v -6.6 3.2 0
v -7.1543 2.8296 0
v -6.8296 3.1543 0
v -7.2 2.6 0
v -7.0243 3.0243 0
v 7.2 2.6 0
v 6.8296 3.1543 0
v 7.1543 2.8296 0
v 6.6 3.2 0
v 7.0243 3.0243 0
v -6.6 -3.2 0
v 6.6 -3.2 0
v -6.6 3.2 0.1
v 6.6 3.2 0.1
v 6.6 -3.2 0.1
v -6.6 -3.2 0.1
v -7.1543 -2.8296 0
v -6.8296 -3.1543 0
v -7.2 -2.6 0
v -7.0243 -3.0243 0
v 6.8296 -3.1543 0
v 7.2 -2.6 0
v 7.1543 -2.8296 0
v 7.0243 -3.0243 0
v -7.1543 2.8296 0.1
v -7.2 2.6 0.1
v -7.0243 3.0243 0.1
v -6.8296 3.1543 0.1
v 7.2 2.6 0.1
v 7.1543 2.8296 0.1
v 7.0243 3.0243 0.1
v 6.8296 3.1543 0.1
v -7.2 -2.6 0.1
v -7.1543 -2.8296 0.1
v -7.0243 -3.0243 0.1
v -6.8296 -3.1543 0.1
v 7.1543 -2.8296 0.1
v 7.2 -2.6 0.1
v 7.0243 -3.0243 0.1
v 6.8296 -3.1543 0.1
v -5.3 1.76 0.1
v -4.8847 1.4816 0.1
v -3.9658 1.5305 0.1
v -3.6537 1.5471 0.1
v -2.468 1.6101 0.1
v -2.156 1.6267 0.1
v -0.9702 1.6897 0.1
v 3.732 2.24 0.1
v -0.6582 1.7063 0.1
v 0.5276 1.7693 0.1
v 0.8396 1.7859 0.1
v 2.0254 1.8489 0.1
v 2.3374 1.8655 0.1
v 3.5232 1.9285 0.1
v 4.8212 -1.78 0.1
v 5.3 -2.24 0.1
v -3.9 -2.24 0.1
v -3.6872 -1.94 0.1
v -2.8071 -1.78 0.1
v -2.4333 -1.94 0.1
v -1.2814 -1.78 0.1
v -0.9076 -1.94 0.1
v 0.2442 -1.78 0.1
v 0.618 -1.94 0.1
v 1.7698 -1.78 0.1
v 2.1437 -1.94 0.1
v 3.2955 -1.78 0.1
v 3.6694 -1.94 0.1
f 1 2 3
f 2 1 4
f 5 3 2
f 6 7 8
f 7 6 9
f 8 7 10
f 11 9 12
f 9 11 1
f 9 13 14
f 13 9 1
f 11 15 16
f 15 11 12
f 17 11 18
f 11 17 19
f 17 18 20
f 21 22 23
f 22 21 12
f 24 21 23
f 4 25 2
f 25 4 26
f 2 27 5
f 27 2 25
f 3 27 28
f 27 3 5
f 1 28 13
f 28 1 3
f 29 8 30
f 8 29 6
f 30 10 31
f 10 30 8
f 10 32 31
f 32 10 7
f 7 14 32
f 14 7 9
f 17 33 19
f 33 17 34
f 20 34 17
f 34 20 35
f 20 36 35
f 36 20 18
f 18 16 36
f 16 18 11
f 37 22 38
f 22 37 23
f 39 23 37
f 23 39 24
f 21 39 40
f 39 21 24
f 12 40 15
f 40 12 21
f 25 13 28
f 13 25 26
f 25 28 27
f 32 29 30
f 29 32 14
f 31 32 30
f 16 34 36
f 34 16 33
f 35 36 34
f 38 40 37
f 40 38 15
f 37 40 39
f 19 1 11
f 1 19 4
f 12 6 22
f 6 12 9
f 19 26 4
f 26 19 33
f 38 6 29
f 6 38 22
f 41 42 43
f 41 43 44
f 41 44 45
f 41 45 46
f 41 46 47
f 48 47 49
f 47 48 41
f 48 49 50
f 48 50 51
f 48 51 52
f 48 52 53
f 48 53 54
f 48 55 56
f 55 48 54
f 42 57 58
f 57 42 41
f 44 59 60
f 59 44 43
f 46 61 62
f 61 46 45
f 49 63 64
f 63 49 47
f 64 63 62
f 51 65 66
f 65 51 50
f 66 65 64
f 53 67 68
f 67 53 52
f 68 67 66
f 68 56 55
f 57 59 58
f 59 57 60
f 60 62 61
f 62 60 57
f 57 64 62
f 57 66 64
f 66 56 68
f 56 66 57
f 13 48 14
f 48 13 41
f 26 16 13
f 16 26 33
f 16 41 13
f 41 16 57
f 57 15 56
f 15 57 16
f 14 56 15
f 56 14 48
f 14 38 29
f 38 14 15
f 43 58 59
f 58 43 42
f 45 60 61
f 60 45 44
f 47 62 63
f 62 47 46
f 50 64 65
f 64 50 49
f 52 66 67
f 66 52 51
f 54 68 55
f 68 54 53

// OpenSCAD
// file: ../p/box3u12.scad
use <../lib.scad>
function ldraw_lib__box3u12() = [
// 0 Box with 3 Parallel Faces without Any Edges
// 0 Name: box3u12.dat
// 0 Author: J.C. Tchang [tchang]
// 0 !LDRAW_ORG Primitive UPDATE 2014-02
// 0 !LICENSE Licensed under CC BY 4.0 : see CAreadme.txt
// 
// 0 BFC CERTIFY CCW
  [0,"BFC","CERTIFY"],
  [0,"BFC","CCW"],
// 
// 0 !HISTORY 2014-12-23 [PTadmin] Official Update 2014-02
// 
// 
// 4 16 -1 1 1 1 1 1 1 1 -1 -1 1 -1
  [4,16,-1,1,1,1,1,1,1,1,-1,-1,1,-1],
// 4 16 -1 1 1 -1 0 1 1 0 1 1 1 1
  [4,16,-1,1,1,-1,0,1,1,0,1,1,1,1],
// 4 16 1 1 -1 1 0 -1 -1 0 -1 -1 1 -1
  [4,16,1,1,-1,1,0,-1,-1,0,-1,-1,1,-1],
];
module ldraw_lib__box3u12(step=0, col=false, unit=2/5, alt=false, line=0.2, solid=!$preview)
    makepoly(ldraw_lib__box3u12(), step=step, col=col, unit=unit, alt=alt, line=line, solid=solid);
ldraw_lib__box3u12(line=0.2);
// file: ../p/1-4cyli.scad
use <../lib.scad>
function ldraw_lib__1_4cyli() = [
// 0 Cylinder 0.25
// 0 Name: 1-4cyli.dat
// 0 Author: James Jessiman
// 0 !LDRAW_ORG Primitive UPDATE 2012-01
// 0 !LICENSE Licensed under CC BY 4.0 : see CAreadme.txt
// 
// 0 BFC CERTIFY CCW
  [0,"BFC","CERTIFY"],
  [0,"BFC","CCW"],
// 
// 0 !HISTORY 2002-03-23 [sbliss] Added BFC statement.
// 0 !HISTORY 2002-04-25 [PTadmin] Official Update 2002-02
// 0 !HISTORY 2007-06-22 [PTadmin] Header formatted for Contributor Agreement
// 0 !HISTORY 2008-07-01 [PTadmin] Official Update 2008-01
// 0 !HISTORY 2012-02-16 [Philo] Changed to CCW
// 0 !HISTORY 2012-03-30 [PTadmin] Official Update 2012-01
// 
// 
// 4 16 1 1 0 0.9239 1 0.3827 0.9239 0 0.3827 1 0 0
  [4,16,1,1,0,0.9239,1,0.3827,0.9239,0,0.3827,1,0,0],
// 5 24 1 0 0 1 1 0 0.9239 0 0.3827 1 0 -1
  [5,24,1,0,0,1,1,0,0.9239,0,0.3827,1,0,-1],
// 4 16 0.9239 1 0.3827 0.7071 1 0.7071 0.7071 0 0.7071 0.9239 0 0.3827
  [4,16,0.9239,1,0.3827,0.7071,1,0.7071,0.7071,0,0.7071,0.9239,0,0.3827],
// 5 24 0.9239 0 0.3827 0.9239 1 0.3827 0.7071 0 0.7071 1 0 0
  [5,24,0.9239,0,0.3827,0.9239,1,0.3827,0.7071,0,0.7071,1,0,0],
// 4 16 0.7071 1 0.7071 0.3827 1 0.9239 0.3827 0 0.9239 0.7071 0 0.7071
  [4,16,0.7071,1,0.7071,0.3827,1,0.9239,0.3827,0,0.9239,0.7071,0,0.7071],
// 5 24 0.7071 0 0.7071 0.7071 1 0.7071 0.3827 0 0.9239 0.9239 0 0.3827
  [5,24,0.7071,0,0.7071,0.7071,1,0.7071,0.3827,0,0.9239,0.9239,0,0.3827],
// 4 16 0.3827 1 0.9239 0 1 1 0 0 1 0.3827 0 0.9239
  [4,16,0.3827,1,0.9239,0,1,1,0,0,1,0.3827,0,0.9239],
// 5 24 0.3827 0 0.9239 0.3827 1 0.9239 0 0 1 0.7071 0 0.7071
  [5,24,0.3827,0,0.9239,0.3827,1,0.9239,0,0,1,0.7071,0,0.7071],
// 5 24 0 0 1 0 1 1 0.3827 0 0.9239 -1 0 1
  [5,24,0,0,1,0,1,1,0.3827,0,0.9239,-1,0,1],
];
module ldraw_lib__1_4cyli(step=0, col=false, unit=2/5, alt=false, line=0.2, solid=!$preview)
    makepoly(ldraw_lib__1_4cyli(), step=step, col=col, unit=unit, alt=alt, line=line, solid=solid);
ldraw_lib__1_4cyli(line=0.2);
// file: ../p/1-4chrd.scad
use <../lib.scad>
function ldraw_lib__1_4chrd() = [
// 0 Chord 0.25
// 0 Name: 1-4chrd.dat
// 0 Author: Max Martin Richter [MMR1988]
// 0 !LDRAW_ORG Primitive UPDATE 2023-05
// 0 !LICENSE Licensed under CC BY 4.0 : see CAreadme.txt
// 
// 0 BFC CERTIFY CCW
  [0,"BFC","CERTIFY"],
  [0,"BFC","CCW"],
// 
// 0 !HISTORY 2004-04-22 [PTadmin] Official Update 2004-02
// 0 !HISTORY 2007-10-09 [PTadmin] Header formatted for Contributor Agreement
// 0 !HISTORY 2008-07-01 [PTadmin] Official Update 2008-01
// 0 !HISTORY 2012-08-02 [MMR1988] Re-creation with PrimGen2 and Rectifier
// 0 !HISTORY 2012-08-09 [PTadmin] Official Update 2012-02
// 0 !HISTORY 2023-10-27 [OrionP] Change author to MMR1988 from hafhead
// 0 !HISTORY 2023-10-31 [OrionP] Official Update 2023-05
// 
// 4 16 0.9239 0 0.3827 0.3827 0 0.9239 0 0 1 1 0 0
  [4,16,0.9239,0,0.3827,0.3827,0,0.9239,0,0,1,1,0,0],
// 3 16 0.7071 0 0.7071 0.3827 0 0.9239 0.9239 0 0.3827
  [3,16,0.7071,0,0.7071,0.3827,0,0.9239,0.9239,0,0.3827],
];
module ldraw_lib__1_4chrd(step=0, col=false, unit=2/5, alt=false, line=0.2, solid=!$preview)
    makepoly(ldraw_lib__1_4chrd(), step=step, col=col, unit=unit, alt=alt, line=line, solid=solid);
ldraw_lib__1_4chrd(line=0.2);
// main file
use <../lib.scad>
use <../p/1-4chrd.scad>
use <../p/1-4cyli.scad>
use <../p/box3u12.scad>
function ldraw_lib__6142271m() = [
// 0 Sticker  0.8 x  1.8 with Black Air Vents on White Background Right
// 0 Name: 6142271m.dat
// 0 Author: Massimo Maso [Sirio]
// 0 !LDRAW_ORG Part UPDATE 2025-03
// 0 !LICENSE Licensed under CC BY 4.0 : see CAreadme.txt
// 
// 0 BFC CERTIFY CCW
  [0,"BFC","CERTIFY"],
  [0,"BFC","CCW"],
// 
// 0 !KEYWORDS Audi, Bricklink 75873stk01a, Brickowl 427960, LMS, R8
// 0 !KEYWORDS Rebrickable 24755, Set 75873, Speed Champions, Ultra
// 
// 0 !HISTORY 2025-03-30 [OrionP] Official Update 2025-03
// 
// 0 // Primitives
// 1 16 -16.5 0 6.5 -1.5 0 0 0 -1 0 0 0 1.5 1-4chrd.dat
  [1,16,-16.5,0,6.5,-1.5,0,0,0,-1,0,0,0,1.5, ldraw_lib__1_4chrd()],
// 1 16 16.5 0 6.5 1.5 0 0 0 -1 0 0 0 1.5 1-4chrd.dat
  [1,16,16.5,0,6.5,1.5,0,0,0,-1,0,0,0,1.5, ldraw_lib__1_4chrd()],
// 1 16 0 -.25 0 16.5 0 0 0 .25 0 0 0 8 box3u12.dat
  [1,16,0,-.25,0,16.5,0,0,0,.25,0,0,0,8, ldraw_lib__box3u12()],
// 1 16 -16.5 0 -6.5 -1.5 0 0 0 -1 0 0 0 -1.5 1-4chrd.dat
  [1,16,-16.5,0,-6.5,-1.5,0,0,0,-1,0,0,0,-1.5, ldraw_lib__1_4chrd()],
// 1 16 16.5 0 -6.5 1.5 0 0 0 -1 0 0 0 -1.5 1-4chrd.dat
  [1,16,16.5,0,-6.5,1.5,0,0,0,-1,0,0,0,-1.5, ldraw_lib__1_4chrd()],
// 1 16 -16.5 0 6.5 -1.5 0 0 0 -.25 0 0 0 1.5 1-4cyli.dat
  [1,16,-16.5,0,6.5,-1.5,0,0,0,-.25,0,0,0,1.5, ldraw_lib__1_4cyli()],
// 1 16 16.5 0 6.5 1.5 0 0 0 -.25 0 0 0 1.5 1-4cyli.dat
  [1,16,16.5,0,6.5,1.5,0,0,0,-.25,0,0,0,1.5, ldraw_lib__1_4cyli()],
// 1 16 -16.5 0 -6.5 -1.5 0 0 0 -.25 0 0 0 -1.5 1-4cyli.dat
  [1,16,-16.5,0,-6.5,-1.5,0,0,0,-.25,0,0,0,-1.5, ldraw_lib__1_4cyli()],
// 1 16 16.5 0 -6.5 1.5 0 0 0 -.25 0 0 0 -1.5 1-4cyli.dat
  [1,16,16.5,0,-6.5,1.5,0,0,0,-.25,0,0,0,-1.5, ldraw_lib__1_4cyli()],
// 1 15 -16.5 -.25 6.5 -1.5 0 0 0 1 0 0 0 1.5 1-4chrd.dat
  [1,15,-16.5,-.25,6.5,-1.5,0,0,0,1,0,0,0,1.5, ldraw_lib__1_4chrd()],
// 1 15 16.5 -.25 6.5 1.5 0 0 0 1 0 0 0 1.5 1-4chrd.dat
  [1,15,16.5,-.25,6.5,1.5,0,0,0,1,0,0,0,1.5, ldraw_lib__1_4chrd()],
// 1 15 -16.5 -.25 -6.5 -1.5 0 0 0 1 0 0 0 -1.5 1-4chrd.dat
  [1,15,-16.5,-.25,-6.5,-1.5,0,0,0,1,0,0,0,-1.5, ldraw_lib__1_4chrd()],
// 1 15 16.5 -.25 -6.5 1.5 0 0 0 1 0 0 0 -1.5 1-4chrd.dat
  [1,15,16.5,-.25,-6.5,1.5,0,0,0,1,0,0,0,-1.5, ldraw_lib__1_4chrd()],
// 0 // Bottom faces
// 4 16 -16.5 0 8 -16.5 0 -8 -18 0 -6.5 -18 0 6.5
  [4,16,-16.5,0,8,-16.5,0,-8,-18,0,-6.5,-18,0,6.5],
// 4 16 16.5 0 8 18 0 6.5 18 0 -6.5 16.5 0 -8
  [4,16,16.5,0,8,18,0,6.5,18,0,-6.5,16.5,0,-8],
// 0 // Lateral faces
// 4 16 -18 0 6.5 -18 0 -6.5 -18 -.25 -6.5 -18 -.25 6.5
  [4,16,-18,0,6.5,-18,0,-6.5,-18,-.25,-6.5,-18,-.25,6.5],
// 4 16 18 0 6.5 18 -.25 6.5 18 -.25 -6.5 18 0 -6.5
  [4,16,18,0,6.5,18,-.25,6.5,18,-.25,-6.5,18,0,-6.5],
// 0 // Black air vents
// 3 0 -13.25 -.25 4.4 -12.2118 -.25 3.7041 -9.9144 -.25 3.8262
  [3,0,-13.25,-.25,4.4,-12.2118,-.25,3.7041,-9.9144,-.25,3.8262],
// 3 0 -13.25 -.25 4.4 -9.9144 -.25 3.8262 -9.1343 -.25 3.8677
  [3,0,-13.25,-.25,4.4,-9.9144,-.25,3.8262,-9.1343,-.25,3.8677],
// 3 0 -13.25 -.25 4.4 -9.1343 -.25 3.8677 -6.17 -.25 4.0252
  [3,0,-13.25,-.25,4.4,-9.1343,-.25,3.8677,-6.17,-.25,4.0252],
// 3 0 -13.25 -.25 4.4 -6.17 -.25 4.0252 -5.3899 -.25 4.0667
  [3,0,-13.25,-.25,4.4,-6.17,-.25,4.0252,-5.3899,-.25,4.0667],
// 3 0 -13.25 -.25 4.4 -5.3899 -.25 4.0667 -2.4255 -.25 4.2242
  [3,0,-13.25,-.25,4.4,-5.3899,-.25,4.0667,-2.4255,-.25,4.2242],
// 4 0 -13.25 -.25 4.4 -2.4255 -.25 4.2242 -1.6454 -.25 4.2657 9.33 -.25 5.6
  [4,0,-13.25,-.25,4.4,-2.4255,-.25,4.2242,-1.6454,-.25,4.2657,9.33,-.25,5.6],
// 3 0 9.33 -.25 5.6 -1.6454 -.25 4.2657 1.319 -.25 4.4232
  [3,0,9.33,-.25,5.6,-1.6454,-.25,4.2657,1.319,-.25,4.4232],
// 3 0 9.33 -.25 5.6 1.319 -.25 4.4232 2.0991 -.25 4.4647
  [3,0,9.33,-.25,5.6,1.319,-.25,4.4232,2.0991,-.25,4.4647],
// 3 0 9.33 -.25 5.6 2.0991 -.25 4.4647 5.0635 -.25 4.6222
  [3,0,9.33,-.25,5.6,2.0991,-.25,4.4647,5.0635,-.25,4.6222],
// 3 0 9.33 -.25 5.6 5.0635 -.25 4.6222 5.8436 -.25 4.6637
  [3,0,9.33,-.25,5.6,5.0635,-.25,4.6222,5.8436,-.25,4.6637],
// 3 0 9.33 -.25 5.6 5.8436 -.25 4.6637 8.808 -.25 4.8212
  [3,0,9.33,-.25,5.6,5.8436,-.25,4.6637,8.808,-.25,4.8212],
// 4 0 9.33 -.25 5.6 8.808 -.25 4.8212 12.0529 -.25 -4.45 13.25 -.25 -5.6
  [4,0,9.33,-.25,5.6,8.808,-.25,4.8212,12.0529,-.25,-4.45,13.25,-.25,-5.6],
// 4 0 -9.2179 -.25 -4.85 -12.2118 -.25 3.7041 -13.25 -.25 4.4 -9.75 -.25 -5.6
  [4,0,-9.2179,-.25,-4.85,-12.2118,-.25,3.7041,-13.25,-.25,4.4,-9.75,-.25,-5.6],
// 4 0 -6.0832 -.25 -4.85 -9.1343 -.25 3.8677 -9.9144 -.25 3.8262 -7.0178 -.25 -4.45
  [4,0,-6.0832,-.25,-4.85,-9.1343,-.25,3.8677,-9.9144,-.25,3.8262,-7.0178,-.25,-4.45],
// 4 0 -2.269 -.25 -4.85 -5.3899 -.25 4.0667 -6.17 -.25 4.0252 -3.2036 -.25 -4.45
  [4,0,-2.269,-.25,-4.85,-5.3899,-.25,4.0667,-6.17,-.25,4.0252,-3.2036,-.25,-4.45],
// 4 0 1.5451 -.25 -4.85 -1.6454 -.25 4.2657 -2.4255 -.25 4.2242 .6105 -.25 -4.45
  [4,0,1.5451,-.25,-4.85,-1.6454,-.25,4.2657,-2.4255,-.25,4.2242,.6105,-.25,-4.45],
// 3 0 1.5451 -.25 -4.85 .6105 -.25 -4.45 -2.269 -.25 -4.85
  [3,0,1.5451,-.25,-4.85,.6105,-.25,-4.45,-2.269,-.25,-4.85],
// 4 0 5.3592 -.25 -4.85 2.0991 -.25 4.4647 1.319 -.25 4.4232 4.4246 -.25 -4.45
  [4,0,5.3592,-.25,-4.85,2.0991,-.25,4.4647,1.319,-.25,4.4232,4.4246,-.25,-4.45],
// 3 0 5.3592 -.25 -4.85 4.4246 -.25 -4.45 1.5451 -.25 -4.85
  [3,0,5.3592,-.25,-4.85,4.4246,-.25,-4.45,1.5451,-.25,-4.85],
// 4 0 9.1734 -.25 -4.85 5.8436 -.25 4.6637 5.0635 -.25 4.6222 8.2388 -.25 -4.45
  [4,0,9.1734,-.25,-4.85,5.8436,-.25,4.6637,5.0635,-.25,4.6222,8.2388,-.25,-4.45],
// 3 0 9.1734 -.25 -4.85 8.2388 -.25 -4.45 5.3592 -.25 -4.85
  [3,0,9.1734,-.25,-4.85,8.2388,-.25,-4.45,5.3592,-.25,-4.85],
// 3 0 9.1734 -.25 -4.85 13.25 -.25 -5.6 12.0529 -.25 -4.45
  [3,0,9.1734,-.25,-4.85,13.25,-.25,-5.6,12.0529,-.25,-4.45],
// 4 0 -9.75 -.25 -5.6 -6.0832 -.25 -4.85 -7.0178 -.25 -4.45 -9.2179 -.25 -4.85
  [4,0,-9.75,-.25,-5.6,-6.0832,-.25,-4.85,-7.0178,-.25,-4.45,-9.2179,-.25,-4.85],
// 4 0 -9.75 -.25 -5.6 -2.269 -.25 -4.85 -3.2036 -.25 -4.45 -6.0832 -.25 -4.85
  [4,0,-9.75,-.25,-5.6,-2.269,-.25,-4.85,-3.2036,-.25,-4.45,-6.0832,-.25,-4.85],
// 3 0 -9.75 -.25 -5.6 1.5451 -.25 -4.85 -2.269 -.25 -4.85
  [3,0,-9.75,-.25,-5.6,1.5451,-.25,-4.85,-2.269,-.25,-4.85],
// 3 0 -9.75 -.25 -5.6 5.3592 -.25 -4.85 1.5451 -.25 -4.85
  [3,0,-9.75,-.25,-5.6,5.3592,-.25,-4.85,1.5451,-.25,-4.85],
// 4 0 -9.75 -.25 -5.6 13.25 -.25 -5.6 9.1734 -.25 -4.85 5.3592 -.25 -4.85
  [4,0,-9.75,-.25,-5.6,13.25,-.25,-5.6,9.1734,-.25,-4.85,5.3592,-.25,-4.85],
// 0 // White top faces
// 4 15 -16.5 -.25 8 -13.25 -.25 4.4 9.33 -.25 5.6 16.5 -.25 8
  [4,15,-16.5,-.25,8,-13.25,-.25,4.4,9.33,-.25,5.6,16.5,-.25,8],
// 4 15 -16.5 -.25 8 -18 -.25 6.5 -18 -.25 -6.5 -16.5 -.25 -8
  [4,15,-16.5,-.25,8,-18,-.25,6.5,-18,-.25,-6.5,-16.5,-.25,-8],
// 4 15 -16.5 -.25 8 -16.5 -.25 -8 -9.75 -.25 -5.6 -13.25 -.25 4.4
  [4,15,-16.5,-.25,8,-16.5,-.25,-8,-9.75,-.25,-5.6,-13.25,-.25,4.4],
// 4 15 16.5 -.25 -8 13.25 -.25 -5.6 -9.75 -.25 -5.6 -16.5 -.25 -8
  [4,15,16.5,-.25,-8,13.25,-.25,-5.6,-9.75,-.25,-5.6,-16.5,-.25,-8],
// 4 15 16.5 -.25 -8 16.5 -.25 8 9.33 -.25 5.6 13.25 -.25 -5.6
  [4,15,16.5,-.25,-8,16.5,-.25,8,9.33,-.25,5.6,13.25,-.25,-5.6],
// 4 15 16.5 -.25 -8 18 -.25 -6.5 18 -.25 6.5 16.5 -.25 8
  [4,15,16.5,-.25,-8,18,-.25,-6.5,18,-.25,6.5,16.5,-.25,8],
// 4 15 -9.2179 -.25 -4.85 -7.0178 -.25 -4.45 -9.9144 -.25 3.8262 -12.2118 -.25 3.7041
  [4,15,-9.2179,-.25,-4.85,-7.0178,-.25,-4.45,-9.9144,-.25,3.8262,-12.2118,-.25,3.7041],
// 4 15 -6.0832 -.25 -4.85 -3.2036 -.25 -4.45 -6.17 -.25 4.0252 -9.1343 -.25 3.8677
  [4,15,-6.0832,-.25,-4.85,-3.2036,-.25,-4.45,-6.17,-.25,4.0252,-9.1343,-.25,3.8677],
// 4 15 -2.269 -.25 -4.85 .6105 -.25 -4.45 -2.4255 -.25 4.2242 -5.3899 -.25 4.0667
  [4,15,-2.269,-.25,-4.85,.6105,-.25,-4.45,-2.4255,-.25,4.2242,-5.3899,-.25,4.0667],
// 4 15 1.5451 -.25 -4.85 4.4246 -.25 -4.45 1.319 -.25 4.4232 -1.6454 -.25 4.2657
  [4,15,1.5451,-.25,-4.85,4.4246,-.25,-4.45,1.319,-.25,4.4232,-1.6454,-.25,4.2657],
// 4 15 5.3592 -.25 -4.85 8.2388 -.25 -4.45 5.0635 -.25 4.6222 2.0991 -.25 4.4647
  [4,15,5.3592,-.25,-4.85,8.2388,-.25,-4.45,5.0635,-.25,4.6222,2.0991,-.25,4.4647],
// 4 15 9.1734 -.25 -4.85 12.0529 -.25 -4.45 8.808 -.25 4.8212 5.8436 -.25 4.6637
  [4,15,9.1734,-.25,-4.85,12.0529,-.25,-4.45,8.808,-.25,4.8212,5.8436,-.25,4.6637],
];
module ldraw_lib__6142271m(step=0, col=false, unit=2/5, alt=false, line=0.2, solid=!$preview)
    makepoly(ldraw_lib__6142271m(), step=step, col=col, unit=unit, alt=alt, line=line, solid=solid);
ldraw_lib__6142271m(line=0.2);
